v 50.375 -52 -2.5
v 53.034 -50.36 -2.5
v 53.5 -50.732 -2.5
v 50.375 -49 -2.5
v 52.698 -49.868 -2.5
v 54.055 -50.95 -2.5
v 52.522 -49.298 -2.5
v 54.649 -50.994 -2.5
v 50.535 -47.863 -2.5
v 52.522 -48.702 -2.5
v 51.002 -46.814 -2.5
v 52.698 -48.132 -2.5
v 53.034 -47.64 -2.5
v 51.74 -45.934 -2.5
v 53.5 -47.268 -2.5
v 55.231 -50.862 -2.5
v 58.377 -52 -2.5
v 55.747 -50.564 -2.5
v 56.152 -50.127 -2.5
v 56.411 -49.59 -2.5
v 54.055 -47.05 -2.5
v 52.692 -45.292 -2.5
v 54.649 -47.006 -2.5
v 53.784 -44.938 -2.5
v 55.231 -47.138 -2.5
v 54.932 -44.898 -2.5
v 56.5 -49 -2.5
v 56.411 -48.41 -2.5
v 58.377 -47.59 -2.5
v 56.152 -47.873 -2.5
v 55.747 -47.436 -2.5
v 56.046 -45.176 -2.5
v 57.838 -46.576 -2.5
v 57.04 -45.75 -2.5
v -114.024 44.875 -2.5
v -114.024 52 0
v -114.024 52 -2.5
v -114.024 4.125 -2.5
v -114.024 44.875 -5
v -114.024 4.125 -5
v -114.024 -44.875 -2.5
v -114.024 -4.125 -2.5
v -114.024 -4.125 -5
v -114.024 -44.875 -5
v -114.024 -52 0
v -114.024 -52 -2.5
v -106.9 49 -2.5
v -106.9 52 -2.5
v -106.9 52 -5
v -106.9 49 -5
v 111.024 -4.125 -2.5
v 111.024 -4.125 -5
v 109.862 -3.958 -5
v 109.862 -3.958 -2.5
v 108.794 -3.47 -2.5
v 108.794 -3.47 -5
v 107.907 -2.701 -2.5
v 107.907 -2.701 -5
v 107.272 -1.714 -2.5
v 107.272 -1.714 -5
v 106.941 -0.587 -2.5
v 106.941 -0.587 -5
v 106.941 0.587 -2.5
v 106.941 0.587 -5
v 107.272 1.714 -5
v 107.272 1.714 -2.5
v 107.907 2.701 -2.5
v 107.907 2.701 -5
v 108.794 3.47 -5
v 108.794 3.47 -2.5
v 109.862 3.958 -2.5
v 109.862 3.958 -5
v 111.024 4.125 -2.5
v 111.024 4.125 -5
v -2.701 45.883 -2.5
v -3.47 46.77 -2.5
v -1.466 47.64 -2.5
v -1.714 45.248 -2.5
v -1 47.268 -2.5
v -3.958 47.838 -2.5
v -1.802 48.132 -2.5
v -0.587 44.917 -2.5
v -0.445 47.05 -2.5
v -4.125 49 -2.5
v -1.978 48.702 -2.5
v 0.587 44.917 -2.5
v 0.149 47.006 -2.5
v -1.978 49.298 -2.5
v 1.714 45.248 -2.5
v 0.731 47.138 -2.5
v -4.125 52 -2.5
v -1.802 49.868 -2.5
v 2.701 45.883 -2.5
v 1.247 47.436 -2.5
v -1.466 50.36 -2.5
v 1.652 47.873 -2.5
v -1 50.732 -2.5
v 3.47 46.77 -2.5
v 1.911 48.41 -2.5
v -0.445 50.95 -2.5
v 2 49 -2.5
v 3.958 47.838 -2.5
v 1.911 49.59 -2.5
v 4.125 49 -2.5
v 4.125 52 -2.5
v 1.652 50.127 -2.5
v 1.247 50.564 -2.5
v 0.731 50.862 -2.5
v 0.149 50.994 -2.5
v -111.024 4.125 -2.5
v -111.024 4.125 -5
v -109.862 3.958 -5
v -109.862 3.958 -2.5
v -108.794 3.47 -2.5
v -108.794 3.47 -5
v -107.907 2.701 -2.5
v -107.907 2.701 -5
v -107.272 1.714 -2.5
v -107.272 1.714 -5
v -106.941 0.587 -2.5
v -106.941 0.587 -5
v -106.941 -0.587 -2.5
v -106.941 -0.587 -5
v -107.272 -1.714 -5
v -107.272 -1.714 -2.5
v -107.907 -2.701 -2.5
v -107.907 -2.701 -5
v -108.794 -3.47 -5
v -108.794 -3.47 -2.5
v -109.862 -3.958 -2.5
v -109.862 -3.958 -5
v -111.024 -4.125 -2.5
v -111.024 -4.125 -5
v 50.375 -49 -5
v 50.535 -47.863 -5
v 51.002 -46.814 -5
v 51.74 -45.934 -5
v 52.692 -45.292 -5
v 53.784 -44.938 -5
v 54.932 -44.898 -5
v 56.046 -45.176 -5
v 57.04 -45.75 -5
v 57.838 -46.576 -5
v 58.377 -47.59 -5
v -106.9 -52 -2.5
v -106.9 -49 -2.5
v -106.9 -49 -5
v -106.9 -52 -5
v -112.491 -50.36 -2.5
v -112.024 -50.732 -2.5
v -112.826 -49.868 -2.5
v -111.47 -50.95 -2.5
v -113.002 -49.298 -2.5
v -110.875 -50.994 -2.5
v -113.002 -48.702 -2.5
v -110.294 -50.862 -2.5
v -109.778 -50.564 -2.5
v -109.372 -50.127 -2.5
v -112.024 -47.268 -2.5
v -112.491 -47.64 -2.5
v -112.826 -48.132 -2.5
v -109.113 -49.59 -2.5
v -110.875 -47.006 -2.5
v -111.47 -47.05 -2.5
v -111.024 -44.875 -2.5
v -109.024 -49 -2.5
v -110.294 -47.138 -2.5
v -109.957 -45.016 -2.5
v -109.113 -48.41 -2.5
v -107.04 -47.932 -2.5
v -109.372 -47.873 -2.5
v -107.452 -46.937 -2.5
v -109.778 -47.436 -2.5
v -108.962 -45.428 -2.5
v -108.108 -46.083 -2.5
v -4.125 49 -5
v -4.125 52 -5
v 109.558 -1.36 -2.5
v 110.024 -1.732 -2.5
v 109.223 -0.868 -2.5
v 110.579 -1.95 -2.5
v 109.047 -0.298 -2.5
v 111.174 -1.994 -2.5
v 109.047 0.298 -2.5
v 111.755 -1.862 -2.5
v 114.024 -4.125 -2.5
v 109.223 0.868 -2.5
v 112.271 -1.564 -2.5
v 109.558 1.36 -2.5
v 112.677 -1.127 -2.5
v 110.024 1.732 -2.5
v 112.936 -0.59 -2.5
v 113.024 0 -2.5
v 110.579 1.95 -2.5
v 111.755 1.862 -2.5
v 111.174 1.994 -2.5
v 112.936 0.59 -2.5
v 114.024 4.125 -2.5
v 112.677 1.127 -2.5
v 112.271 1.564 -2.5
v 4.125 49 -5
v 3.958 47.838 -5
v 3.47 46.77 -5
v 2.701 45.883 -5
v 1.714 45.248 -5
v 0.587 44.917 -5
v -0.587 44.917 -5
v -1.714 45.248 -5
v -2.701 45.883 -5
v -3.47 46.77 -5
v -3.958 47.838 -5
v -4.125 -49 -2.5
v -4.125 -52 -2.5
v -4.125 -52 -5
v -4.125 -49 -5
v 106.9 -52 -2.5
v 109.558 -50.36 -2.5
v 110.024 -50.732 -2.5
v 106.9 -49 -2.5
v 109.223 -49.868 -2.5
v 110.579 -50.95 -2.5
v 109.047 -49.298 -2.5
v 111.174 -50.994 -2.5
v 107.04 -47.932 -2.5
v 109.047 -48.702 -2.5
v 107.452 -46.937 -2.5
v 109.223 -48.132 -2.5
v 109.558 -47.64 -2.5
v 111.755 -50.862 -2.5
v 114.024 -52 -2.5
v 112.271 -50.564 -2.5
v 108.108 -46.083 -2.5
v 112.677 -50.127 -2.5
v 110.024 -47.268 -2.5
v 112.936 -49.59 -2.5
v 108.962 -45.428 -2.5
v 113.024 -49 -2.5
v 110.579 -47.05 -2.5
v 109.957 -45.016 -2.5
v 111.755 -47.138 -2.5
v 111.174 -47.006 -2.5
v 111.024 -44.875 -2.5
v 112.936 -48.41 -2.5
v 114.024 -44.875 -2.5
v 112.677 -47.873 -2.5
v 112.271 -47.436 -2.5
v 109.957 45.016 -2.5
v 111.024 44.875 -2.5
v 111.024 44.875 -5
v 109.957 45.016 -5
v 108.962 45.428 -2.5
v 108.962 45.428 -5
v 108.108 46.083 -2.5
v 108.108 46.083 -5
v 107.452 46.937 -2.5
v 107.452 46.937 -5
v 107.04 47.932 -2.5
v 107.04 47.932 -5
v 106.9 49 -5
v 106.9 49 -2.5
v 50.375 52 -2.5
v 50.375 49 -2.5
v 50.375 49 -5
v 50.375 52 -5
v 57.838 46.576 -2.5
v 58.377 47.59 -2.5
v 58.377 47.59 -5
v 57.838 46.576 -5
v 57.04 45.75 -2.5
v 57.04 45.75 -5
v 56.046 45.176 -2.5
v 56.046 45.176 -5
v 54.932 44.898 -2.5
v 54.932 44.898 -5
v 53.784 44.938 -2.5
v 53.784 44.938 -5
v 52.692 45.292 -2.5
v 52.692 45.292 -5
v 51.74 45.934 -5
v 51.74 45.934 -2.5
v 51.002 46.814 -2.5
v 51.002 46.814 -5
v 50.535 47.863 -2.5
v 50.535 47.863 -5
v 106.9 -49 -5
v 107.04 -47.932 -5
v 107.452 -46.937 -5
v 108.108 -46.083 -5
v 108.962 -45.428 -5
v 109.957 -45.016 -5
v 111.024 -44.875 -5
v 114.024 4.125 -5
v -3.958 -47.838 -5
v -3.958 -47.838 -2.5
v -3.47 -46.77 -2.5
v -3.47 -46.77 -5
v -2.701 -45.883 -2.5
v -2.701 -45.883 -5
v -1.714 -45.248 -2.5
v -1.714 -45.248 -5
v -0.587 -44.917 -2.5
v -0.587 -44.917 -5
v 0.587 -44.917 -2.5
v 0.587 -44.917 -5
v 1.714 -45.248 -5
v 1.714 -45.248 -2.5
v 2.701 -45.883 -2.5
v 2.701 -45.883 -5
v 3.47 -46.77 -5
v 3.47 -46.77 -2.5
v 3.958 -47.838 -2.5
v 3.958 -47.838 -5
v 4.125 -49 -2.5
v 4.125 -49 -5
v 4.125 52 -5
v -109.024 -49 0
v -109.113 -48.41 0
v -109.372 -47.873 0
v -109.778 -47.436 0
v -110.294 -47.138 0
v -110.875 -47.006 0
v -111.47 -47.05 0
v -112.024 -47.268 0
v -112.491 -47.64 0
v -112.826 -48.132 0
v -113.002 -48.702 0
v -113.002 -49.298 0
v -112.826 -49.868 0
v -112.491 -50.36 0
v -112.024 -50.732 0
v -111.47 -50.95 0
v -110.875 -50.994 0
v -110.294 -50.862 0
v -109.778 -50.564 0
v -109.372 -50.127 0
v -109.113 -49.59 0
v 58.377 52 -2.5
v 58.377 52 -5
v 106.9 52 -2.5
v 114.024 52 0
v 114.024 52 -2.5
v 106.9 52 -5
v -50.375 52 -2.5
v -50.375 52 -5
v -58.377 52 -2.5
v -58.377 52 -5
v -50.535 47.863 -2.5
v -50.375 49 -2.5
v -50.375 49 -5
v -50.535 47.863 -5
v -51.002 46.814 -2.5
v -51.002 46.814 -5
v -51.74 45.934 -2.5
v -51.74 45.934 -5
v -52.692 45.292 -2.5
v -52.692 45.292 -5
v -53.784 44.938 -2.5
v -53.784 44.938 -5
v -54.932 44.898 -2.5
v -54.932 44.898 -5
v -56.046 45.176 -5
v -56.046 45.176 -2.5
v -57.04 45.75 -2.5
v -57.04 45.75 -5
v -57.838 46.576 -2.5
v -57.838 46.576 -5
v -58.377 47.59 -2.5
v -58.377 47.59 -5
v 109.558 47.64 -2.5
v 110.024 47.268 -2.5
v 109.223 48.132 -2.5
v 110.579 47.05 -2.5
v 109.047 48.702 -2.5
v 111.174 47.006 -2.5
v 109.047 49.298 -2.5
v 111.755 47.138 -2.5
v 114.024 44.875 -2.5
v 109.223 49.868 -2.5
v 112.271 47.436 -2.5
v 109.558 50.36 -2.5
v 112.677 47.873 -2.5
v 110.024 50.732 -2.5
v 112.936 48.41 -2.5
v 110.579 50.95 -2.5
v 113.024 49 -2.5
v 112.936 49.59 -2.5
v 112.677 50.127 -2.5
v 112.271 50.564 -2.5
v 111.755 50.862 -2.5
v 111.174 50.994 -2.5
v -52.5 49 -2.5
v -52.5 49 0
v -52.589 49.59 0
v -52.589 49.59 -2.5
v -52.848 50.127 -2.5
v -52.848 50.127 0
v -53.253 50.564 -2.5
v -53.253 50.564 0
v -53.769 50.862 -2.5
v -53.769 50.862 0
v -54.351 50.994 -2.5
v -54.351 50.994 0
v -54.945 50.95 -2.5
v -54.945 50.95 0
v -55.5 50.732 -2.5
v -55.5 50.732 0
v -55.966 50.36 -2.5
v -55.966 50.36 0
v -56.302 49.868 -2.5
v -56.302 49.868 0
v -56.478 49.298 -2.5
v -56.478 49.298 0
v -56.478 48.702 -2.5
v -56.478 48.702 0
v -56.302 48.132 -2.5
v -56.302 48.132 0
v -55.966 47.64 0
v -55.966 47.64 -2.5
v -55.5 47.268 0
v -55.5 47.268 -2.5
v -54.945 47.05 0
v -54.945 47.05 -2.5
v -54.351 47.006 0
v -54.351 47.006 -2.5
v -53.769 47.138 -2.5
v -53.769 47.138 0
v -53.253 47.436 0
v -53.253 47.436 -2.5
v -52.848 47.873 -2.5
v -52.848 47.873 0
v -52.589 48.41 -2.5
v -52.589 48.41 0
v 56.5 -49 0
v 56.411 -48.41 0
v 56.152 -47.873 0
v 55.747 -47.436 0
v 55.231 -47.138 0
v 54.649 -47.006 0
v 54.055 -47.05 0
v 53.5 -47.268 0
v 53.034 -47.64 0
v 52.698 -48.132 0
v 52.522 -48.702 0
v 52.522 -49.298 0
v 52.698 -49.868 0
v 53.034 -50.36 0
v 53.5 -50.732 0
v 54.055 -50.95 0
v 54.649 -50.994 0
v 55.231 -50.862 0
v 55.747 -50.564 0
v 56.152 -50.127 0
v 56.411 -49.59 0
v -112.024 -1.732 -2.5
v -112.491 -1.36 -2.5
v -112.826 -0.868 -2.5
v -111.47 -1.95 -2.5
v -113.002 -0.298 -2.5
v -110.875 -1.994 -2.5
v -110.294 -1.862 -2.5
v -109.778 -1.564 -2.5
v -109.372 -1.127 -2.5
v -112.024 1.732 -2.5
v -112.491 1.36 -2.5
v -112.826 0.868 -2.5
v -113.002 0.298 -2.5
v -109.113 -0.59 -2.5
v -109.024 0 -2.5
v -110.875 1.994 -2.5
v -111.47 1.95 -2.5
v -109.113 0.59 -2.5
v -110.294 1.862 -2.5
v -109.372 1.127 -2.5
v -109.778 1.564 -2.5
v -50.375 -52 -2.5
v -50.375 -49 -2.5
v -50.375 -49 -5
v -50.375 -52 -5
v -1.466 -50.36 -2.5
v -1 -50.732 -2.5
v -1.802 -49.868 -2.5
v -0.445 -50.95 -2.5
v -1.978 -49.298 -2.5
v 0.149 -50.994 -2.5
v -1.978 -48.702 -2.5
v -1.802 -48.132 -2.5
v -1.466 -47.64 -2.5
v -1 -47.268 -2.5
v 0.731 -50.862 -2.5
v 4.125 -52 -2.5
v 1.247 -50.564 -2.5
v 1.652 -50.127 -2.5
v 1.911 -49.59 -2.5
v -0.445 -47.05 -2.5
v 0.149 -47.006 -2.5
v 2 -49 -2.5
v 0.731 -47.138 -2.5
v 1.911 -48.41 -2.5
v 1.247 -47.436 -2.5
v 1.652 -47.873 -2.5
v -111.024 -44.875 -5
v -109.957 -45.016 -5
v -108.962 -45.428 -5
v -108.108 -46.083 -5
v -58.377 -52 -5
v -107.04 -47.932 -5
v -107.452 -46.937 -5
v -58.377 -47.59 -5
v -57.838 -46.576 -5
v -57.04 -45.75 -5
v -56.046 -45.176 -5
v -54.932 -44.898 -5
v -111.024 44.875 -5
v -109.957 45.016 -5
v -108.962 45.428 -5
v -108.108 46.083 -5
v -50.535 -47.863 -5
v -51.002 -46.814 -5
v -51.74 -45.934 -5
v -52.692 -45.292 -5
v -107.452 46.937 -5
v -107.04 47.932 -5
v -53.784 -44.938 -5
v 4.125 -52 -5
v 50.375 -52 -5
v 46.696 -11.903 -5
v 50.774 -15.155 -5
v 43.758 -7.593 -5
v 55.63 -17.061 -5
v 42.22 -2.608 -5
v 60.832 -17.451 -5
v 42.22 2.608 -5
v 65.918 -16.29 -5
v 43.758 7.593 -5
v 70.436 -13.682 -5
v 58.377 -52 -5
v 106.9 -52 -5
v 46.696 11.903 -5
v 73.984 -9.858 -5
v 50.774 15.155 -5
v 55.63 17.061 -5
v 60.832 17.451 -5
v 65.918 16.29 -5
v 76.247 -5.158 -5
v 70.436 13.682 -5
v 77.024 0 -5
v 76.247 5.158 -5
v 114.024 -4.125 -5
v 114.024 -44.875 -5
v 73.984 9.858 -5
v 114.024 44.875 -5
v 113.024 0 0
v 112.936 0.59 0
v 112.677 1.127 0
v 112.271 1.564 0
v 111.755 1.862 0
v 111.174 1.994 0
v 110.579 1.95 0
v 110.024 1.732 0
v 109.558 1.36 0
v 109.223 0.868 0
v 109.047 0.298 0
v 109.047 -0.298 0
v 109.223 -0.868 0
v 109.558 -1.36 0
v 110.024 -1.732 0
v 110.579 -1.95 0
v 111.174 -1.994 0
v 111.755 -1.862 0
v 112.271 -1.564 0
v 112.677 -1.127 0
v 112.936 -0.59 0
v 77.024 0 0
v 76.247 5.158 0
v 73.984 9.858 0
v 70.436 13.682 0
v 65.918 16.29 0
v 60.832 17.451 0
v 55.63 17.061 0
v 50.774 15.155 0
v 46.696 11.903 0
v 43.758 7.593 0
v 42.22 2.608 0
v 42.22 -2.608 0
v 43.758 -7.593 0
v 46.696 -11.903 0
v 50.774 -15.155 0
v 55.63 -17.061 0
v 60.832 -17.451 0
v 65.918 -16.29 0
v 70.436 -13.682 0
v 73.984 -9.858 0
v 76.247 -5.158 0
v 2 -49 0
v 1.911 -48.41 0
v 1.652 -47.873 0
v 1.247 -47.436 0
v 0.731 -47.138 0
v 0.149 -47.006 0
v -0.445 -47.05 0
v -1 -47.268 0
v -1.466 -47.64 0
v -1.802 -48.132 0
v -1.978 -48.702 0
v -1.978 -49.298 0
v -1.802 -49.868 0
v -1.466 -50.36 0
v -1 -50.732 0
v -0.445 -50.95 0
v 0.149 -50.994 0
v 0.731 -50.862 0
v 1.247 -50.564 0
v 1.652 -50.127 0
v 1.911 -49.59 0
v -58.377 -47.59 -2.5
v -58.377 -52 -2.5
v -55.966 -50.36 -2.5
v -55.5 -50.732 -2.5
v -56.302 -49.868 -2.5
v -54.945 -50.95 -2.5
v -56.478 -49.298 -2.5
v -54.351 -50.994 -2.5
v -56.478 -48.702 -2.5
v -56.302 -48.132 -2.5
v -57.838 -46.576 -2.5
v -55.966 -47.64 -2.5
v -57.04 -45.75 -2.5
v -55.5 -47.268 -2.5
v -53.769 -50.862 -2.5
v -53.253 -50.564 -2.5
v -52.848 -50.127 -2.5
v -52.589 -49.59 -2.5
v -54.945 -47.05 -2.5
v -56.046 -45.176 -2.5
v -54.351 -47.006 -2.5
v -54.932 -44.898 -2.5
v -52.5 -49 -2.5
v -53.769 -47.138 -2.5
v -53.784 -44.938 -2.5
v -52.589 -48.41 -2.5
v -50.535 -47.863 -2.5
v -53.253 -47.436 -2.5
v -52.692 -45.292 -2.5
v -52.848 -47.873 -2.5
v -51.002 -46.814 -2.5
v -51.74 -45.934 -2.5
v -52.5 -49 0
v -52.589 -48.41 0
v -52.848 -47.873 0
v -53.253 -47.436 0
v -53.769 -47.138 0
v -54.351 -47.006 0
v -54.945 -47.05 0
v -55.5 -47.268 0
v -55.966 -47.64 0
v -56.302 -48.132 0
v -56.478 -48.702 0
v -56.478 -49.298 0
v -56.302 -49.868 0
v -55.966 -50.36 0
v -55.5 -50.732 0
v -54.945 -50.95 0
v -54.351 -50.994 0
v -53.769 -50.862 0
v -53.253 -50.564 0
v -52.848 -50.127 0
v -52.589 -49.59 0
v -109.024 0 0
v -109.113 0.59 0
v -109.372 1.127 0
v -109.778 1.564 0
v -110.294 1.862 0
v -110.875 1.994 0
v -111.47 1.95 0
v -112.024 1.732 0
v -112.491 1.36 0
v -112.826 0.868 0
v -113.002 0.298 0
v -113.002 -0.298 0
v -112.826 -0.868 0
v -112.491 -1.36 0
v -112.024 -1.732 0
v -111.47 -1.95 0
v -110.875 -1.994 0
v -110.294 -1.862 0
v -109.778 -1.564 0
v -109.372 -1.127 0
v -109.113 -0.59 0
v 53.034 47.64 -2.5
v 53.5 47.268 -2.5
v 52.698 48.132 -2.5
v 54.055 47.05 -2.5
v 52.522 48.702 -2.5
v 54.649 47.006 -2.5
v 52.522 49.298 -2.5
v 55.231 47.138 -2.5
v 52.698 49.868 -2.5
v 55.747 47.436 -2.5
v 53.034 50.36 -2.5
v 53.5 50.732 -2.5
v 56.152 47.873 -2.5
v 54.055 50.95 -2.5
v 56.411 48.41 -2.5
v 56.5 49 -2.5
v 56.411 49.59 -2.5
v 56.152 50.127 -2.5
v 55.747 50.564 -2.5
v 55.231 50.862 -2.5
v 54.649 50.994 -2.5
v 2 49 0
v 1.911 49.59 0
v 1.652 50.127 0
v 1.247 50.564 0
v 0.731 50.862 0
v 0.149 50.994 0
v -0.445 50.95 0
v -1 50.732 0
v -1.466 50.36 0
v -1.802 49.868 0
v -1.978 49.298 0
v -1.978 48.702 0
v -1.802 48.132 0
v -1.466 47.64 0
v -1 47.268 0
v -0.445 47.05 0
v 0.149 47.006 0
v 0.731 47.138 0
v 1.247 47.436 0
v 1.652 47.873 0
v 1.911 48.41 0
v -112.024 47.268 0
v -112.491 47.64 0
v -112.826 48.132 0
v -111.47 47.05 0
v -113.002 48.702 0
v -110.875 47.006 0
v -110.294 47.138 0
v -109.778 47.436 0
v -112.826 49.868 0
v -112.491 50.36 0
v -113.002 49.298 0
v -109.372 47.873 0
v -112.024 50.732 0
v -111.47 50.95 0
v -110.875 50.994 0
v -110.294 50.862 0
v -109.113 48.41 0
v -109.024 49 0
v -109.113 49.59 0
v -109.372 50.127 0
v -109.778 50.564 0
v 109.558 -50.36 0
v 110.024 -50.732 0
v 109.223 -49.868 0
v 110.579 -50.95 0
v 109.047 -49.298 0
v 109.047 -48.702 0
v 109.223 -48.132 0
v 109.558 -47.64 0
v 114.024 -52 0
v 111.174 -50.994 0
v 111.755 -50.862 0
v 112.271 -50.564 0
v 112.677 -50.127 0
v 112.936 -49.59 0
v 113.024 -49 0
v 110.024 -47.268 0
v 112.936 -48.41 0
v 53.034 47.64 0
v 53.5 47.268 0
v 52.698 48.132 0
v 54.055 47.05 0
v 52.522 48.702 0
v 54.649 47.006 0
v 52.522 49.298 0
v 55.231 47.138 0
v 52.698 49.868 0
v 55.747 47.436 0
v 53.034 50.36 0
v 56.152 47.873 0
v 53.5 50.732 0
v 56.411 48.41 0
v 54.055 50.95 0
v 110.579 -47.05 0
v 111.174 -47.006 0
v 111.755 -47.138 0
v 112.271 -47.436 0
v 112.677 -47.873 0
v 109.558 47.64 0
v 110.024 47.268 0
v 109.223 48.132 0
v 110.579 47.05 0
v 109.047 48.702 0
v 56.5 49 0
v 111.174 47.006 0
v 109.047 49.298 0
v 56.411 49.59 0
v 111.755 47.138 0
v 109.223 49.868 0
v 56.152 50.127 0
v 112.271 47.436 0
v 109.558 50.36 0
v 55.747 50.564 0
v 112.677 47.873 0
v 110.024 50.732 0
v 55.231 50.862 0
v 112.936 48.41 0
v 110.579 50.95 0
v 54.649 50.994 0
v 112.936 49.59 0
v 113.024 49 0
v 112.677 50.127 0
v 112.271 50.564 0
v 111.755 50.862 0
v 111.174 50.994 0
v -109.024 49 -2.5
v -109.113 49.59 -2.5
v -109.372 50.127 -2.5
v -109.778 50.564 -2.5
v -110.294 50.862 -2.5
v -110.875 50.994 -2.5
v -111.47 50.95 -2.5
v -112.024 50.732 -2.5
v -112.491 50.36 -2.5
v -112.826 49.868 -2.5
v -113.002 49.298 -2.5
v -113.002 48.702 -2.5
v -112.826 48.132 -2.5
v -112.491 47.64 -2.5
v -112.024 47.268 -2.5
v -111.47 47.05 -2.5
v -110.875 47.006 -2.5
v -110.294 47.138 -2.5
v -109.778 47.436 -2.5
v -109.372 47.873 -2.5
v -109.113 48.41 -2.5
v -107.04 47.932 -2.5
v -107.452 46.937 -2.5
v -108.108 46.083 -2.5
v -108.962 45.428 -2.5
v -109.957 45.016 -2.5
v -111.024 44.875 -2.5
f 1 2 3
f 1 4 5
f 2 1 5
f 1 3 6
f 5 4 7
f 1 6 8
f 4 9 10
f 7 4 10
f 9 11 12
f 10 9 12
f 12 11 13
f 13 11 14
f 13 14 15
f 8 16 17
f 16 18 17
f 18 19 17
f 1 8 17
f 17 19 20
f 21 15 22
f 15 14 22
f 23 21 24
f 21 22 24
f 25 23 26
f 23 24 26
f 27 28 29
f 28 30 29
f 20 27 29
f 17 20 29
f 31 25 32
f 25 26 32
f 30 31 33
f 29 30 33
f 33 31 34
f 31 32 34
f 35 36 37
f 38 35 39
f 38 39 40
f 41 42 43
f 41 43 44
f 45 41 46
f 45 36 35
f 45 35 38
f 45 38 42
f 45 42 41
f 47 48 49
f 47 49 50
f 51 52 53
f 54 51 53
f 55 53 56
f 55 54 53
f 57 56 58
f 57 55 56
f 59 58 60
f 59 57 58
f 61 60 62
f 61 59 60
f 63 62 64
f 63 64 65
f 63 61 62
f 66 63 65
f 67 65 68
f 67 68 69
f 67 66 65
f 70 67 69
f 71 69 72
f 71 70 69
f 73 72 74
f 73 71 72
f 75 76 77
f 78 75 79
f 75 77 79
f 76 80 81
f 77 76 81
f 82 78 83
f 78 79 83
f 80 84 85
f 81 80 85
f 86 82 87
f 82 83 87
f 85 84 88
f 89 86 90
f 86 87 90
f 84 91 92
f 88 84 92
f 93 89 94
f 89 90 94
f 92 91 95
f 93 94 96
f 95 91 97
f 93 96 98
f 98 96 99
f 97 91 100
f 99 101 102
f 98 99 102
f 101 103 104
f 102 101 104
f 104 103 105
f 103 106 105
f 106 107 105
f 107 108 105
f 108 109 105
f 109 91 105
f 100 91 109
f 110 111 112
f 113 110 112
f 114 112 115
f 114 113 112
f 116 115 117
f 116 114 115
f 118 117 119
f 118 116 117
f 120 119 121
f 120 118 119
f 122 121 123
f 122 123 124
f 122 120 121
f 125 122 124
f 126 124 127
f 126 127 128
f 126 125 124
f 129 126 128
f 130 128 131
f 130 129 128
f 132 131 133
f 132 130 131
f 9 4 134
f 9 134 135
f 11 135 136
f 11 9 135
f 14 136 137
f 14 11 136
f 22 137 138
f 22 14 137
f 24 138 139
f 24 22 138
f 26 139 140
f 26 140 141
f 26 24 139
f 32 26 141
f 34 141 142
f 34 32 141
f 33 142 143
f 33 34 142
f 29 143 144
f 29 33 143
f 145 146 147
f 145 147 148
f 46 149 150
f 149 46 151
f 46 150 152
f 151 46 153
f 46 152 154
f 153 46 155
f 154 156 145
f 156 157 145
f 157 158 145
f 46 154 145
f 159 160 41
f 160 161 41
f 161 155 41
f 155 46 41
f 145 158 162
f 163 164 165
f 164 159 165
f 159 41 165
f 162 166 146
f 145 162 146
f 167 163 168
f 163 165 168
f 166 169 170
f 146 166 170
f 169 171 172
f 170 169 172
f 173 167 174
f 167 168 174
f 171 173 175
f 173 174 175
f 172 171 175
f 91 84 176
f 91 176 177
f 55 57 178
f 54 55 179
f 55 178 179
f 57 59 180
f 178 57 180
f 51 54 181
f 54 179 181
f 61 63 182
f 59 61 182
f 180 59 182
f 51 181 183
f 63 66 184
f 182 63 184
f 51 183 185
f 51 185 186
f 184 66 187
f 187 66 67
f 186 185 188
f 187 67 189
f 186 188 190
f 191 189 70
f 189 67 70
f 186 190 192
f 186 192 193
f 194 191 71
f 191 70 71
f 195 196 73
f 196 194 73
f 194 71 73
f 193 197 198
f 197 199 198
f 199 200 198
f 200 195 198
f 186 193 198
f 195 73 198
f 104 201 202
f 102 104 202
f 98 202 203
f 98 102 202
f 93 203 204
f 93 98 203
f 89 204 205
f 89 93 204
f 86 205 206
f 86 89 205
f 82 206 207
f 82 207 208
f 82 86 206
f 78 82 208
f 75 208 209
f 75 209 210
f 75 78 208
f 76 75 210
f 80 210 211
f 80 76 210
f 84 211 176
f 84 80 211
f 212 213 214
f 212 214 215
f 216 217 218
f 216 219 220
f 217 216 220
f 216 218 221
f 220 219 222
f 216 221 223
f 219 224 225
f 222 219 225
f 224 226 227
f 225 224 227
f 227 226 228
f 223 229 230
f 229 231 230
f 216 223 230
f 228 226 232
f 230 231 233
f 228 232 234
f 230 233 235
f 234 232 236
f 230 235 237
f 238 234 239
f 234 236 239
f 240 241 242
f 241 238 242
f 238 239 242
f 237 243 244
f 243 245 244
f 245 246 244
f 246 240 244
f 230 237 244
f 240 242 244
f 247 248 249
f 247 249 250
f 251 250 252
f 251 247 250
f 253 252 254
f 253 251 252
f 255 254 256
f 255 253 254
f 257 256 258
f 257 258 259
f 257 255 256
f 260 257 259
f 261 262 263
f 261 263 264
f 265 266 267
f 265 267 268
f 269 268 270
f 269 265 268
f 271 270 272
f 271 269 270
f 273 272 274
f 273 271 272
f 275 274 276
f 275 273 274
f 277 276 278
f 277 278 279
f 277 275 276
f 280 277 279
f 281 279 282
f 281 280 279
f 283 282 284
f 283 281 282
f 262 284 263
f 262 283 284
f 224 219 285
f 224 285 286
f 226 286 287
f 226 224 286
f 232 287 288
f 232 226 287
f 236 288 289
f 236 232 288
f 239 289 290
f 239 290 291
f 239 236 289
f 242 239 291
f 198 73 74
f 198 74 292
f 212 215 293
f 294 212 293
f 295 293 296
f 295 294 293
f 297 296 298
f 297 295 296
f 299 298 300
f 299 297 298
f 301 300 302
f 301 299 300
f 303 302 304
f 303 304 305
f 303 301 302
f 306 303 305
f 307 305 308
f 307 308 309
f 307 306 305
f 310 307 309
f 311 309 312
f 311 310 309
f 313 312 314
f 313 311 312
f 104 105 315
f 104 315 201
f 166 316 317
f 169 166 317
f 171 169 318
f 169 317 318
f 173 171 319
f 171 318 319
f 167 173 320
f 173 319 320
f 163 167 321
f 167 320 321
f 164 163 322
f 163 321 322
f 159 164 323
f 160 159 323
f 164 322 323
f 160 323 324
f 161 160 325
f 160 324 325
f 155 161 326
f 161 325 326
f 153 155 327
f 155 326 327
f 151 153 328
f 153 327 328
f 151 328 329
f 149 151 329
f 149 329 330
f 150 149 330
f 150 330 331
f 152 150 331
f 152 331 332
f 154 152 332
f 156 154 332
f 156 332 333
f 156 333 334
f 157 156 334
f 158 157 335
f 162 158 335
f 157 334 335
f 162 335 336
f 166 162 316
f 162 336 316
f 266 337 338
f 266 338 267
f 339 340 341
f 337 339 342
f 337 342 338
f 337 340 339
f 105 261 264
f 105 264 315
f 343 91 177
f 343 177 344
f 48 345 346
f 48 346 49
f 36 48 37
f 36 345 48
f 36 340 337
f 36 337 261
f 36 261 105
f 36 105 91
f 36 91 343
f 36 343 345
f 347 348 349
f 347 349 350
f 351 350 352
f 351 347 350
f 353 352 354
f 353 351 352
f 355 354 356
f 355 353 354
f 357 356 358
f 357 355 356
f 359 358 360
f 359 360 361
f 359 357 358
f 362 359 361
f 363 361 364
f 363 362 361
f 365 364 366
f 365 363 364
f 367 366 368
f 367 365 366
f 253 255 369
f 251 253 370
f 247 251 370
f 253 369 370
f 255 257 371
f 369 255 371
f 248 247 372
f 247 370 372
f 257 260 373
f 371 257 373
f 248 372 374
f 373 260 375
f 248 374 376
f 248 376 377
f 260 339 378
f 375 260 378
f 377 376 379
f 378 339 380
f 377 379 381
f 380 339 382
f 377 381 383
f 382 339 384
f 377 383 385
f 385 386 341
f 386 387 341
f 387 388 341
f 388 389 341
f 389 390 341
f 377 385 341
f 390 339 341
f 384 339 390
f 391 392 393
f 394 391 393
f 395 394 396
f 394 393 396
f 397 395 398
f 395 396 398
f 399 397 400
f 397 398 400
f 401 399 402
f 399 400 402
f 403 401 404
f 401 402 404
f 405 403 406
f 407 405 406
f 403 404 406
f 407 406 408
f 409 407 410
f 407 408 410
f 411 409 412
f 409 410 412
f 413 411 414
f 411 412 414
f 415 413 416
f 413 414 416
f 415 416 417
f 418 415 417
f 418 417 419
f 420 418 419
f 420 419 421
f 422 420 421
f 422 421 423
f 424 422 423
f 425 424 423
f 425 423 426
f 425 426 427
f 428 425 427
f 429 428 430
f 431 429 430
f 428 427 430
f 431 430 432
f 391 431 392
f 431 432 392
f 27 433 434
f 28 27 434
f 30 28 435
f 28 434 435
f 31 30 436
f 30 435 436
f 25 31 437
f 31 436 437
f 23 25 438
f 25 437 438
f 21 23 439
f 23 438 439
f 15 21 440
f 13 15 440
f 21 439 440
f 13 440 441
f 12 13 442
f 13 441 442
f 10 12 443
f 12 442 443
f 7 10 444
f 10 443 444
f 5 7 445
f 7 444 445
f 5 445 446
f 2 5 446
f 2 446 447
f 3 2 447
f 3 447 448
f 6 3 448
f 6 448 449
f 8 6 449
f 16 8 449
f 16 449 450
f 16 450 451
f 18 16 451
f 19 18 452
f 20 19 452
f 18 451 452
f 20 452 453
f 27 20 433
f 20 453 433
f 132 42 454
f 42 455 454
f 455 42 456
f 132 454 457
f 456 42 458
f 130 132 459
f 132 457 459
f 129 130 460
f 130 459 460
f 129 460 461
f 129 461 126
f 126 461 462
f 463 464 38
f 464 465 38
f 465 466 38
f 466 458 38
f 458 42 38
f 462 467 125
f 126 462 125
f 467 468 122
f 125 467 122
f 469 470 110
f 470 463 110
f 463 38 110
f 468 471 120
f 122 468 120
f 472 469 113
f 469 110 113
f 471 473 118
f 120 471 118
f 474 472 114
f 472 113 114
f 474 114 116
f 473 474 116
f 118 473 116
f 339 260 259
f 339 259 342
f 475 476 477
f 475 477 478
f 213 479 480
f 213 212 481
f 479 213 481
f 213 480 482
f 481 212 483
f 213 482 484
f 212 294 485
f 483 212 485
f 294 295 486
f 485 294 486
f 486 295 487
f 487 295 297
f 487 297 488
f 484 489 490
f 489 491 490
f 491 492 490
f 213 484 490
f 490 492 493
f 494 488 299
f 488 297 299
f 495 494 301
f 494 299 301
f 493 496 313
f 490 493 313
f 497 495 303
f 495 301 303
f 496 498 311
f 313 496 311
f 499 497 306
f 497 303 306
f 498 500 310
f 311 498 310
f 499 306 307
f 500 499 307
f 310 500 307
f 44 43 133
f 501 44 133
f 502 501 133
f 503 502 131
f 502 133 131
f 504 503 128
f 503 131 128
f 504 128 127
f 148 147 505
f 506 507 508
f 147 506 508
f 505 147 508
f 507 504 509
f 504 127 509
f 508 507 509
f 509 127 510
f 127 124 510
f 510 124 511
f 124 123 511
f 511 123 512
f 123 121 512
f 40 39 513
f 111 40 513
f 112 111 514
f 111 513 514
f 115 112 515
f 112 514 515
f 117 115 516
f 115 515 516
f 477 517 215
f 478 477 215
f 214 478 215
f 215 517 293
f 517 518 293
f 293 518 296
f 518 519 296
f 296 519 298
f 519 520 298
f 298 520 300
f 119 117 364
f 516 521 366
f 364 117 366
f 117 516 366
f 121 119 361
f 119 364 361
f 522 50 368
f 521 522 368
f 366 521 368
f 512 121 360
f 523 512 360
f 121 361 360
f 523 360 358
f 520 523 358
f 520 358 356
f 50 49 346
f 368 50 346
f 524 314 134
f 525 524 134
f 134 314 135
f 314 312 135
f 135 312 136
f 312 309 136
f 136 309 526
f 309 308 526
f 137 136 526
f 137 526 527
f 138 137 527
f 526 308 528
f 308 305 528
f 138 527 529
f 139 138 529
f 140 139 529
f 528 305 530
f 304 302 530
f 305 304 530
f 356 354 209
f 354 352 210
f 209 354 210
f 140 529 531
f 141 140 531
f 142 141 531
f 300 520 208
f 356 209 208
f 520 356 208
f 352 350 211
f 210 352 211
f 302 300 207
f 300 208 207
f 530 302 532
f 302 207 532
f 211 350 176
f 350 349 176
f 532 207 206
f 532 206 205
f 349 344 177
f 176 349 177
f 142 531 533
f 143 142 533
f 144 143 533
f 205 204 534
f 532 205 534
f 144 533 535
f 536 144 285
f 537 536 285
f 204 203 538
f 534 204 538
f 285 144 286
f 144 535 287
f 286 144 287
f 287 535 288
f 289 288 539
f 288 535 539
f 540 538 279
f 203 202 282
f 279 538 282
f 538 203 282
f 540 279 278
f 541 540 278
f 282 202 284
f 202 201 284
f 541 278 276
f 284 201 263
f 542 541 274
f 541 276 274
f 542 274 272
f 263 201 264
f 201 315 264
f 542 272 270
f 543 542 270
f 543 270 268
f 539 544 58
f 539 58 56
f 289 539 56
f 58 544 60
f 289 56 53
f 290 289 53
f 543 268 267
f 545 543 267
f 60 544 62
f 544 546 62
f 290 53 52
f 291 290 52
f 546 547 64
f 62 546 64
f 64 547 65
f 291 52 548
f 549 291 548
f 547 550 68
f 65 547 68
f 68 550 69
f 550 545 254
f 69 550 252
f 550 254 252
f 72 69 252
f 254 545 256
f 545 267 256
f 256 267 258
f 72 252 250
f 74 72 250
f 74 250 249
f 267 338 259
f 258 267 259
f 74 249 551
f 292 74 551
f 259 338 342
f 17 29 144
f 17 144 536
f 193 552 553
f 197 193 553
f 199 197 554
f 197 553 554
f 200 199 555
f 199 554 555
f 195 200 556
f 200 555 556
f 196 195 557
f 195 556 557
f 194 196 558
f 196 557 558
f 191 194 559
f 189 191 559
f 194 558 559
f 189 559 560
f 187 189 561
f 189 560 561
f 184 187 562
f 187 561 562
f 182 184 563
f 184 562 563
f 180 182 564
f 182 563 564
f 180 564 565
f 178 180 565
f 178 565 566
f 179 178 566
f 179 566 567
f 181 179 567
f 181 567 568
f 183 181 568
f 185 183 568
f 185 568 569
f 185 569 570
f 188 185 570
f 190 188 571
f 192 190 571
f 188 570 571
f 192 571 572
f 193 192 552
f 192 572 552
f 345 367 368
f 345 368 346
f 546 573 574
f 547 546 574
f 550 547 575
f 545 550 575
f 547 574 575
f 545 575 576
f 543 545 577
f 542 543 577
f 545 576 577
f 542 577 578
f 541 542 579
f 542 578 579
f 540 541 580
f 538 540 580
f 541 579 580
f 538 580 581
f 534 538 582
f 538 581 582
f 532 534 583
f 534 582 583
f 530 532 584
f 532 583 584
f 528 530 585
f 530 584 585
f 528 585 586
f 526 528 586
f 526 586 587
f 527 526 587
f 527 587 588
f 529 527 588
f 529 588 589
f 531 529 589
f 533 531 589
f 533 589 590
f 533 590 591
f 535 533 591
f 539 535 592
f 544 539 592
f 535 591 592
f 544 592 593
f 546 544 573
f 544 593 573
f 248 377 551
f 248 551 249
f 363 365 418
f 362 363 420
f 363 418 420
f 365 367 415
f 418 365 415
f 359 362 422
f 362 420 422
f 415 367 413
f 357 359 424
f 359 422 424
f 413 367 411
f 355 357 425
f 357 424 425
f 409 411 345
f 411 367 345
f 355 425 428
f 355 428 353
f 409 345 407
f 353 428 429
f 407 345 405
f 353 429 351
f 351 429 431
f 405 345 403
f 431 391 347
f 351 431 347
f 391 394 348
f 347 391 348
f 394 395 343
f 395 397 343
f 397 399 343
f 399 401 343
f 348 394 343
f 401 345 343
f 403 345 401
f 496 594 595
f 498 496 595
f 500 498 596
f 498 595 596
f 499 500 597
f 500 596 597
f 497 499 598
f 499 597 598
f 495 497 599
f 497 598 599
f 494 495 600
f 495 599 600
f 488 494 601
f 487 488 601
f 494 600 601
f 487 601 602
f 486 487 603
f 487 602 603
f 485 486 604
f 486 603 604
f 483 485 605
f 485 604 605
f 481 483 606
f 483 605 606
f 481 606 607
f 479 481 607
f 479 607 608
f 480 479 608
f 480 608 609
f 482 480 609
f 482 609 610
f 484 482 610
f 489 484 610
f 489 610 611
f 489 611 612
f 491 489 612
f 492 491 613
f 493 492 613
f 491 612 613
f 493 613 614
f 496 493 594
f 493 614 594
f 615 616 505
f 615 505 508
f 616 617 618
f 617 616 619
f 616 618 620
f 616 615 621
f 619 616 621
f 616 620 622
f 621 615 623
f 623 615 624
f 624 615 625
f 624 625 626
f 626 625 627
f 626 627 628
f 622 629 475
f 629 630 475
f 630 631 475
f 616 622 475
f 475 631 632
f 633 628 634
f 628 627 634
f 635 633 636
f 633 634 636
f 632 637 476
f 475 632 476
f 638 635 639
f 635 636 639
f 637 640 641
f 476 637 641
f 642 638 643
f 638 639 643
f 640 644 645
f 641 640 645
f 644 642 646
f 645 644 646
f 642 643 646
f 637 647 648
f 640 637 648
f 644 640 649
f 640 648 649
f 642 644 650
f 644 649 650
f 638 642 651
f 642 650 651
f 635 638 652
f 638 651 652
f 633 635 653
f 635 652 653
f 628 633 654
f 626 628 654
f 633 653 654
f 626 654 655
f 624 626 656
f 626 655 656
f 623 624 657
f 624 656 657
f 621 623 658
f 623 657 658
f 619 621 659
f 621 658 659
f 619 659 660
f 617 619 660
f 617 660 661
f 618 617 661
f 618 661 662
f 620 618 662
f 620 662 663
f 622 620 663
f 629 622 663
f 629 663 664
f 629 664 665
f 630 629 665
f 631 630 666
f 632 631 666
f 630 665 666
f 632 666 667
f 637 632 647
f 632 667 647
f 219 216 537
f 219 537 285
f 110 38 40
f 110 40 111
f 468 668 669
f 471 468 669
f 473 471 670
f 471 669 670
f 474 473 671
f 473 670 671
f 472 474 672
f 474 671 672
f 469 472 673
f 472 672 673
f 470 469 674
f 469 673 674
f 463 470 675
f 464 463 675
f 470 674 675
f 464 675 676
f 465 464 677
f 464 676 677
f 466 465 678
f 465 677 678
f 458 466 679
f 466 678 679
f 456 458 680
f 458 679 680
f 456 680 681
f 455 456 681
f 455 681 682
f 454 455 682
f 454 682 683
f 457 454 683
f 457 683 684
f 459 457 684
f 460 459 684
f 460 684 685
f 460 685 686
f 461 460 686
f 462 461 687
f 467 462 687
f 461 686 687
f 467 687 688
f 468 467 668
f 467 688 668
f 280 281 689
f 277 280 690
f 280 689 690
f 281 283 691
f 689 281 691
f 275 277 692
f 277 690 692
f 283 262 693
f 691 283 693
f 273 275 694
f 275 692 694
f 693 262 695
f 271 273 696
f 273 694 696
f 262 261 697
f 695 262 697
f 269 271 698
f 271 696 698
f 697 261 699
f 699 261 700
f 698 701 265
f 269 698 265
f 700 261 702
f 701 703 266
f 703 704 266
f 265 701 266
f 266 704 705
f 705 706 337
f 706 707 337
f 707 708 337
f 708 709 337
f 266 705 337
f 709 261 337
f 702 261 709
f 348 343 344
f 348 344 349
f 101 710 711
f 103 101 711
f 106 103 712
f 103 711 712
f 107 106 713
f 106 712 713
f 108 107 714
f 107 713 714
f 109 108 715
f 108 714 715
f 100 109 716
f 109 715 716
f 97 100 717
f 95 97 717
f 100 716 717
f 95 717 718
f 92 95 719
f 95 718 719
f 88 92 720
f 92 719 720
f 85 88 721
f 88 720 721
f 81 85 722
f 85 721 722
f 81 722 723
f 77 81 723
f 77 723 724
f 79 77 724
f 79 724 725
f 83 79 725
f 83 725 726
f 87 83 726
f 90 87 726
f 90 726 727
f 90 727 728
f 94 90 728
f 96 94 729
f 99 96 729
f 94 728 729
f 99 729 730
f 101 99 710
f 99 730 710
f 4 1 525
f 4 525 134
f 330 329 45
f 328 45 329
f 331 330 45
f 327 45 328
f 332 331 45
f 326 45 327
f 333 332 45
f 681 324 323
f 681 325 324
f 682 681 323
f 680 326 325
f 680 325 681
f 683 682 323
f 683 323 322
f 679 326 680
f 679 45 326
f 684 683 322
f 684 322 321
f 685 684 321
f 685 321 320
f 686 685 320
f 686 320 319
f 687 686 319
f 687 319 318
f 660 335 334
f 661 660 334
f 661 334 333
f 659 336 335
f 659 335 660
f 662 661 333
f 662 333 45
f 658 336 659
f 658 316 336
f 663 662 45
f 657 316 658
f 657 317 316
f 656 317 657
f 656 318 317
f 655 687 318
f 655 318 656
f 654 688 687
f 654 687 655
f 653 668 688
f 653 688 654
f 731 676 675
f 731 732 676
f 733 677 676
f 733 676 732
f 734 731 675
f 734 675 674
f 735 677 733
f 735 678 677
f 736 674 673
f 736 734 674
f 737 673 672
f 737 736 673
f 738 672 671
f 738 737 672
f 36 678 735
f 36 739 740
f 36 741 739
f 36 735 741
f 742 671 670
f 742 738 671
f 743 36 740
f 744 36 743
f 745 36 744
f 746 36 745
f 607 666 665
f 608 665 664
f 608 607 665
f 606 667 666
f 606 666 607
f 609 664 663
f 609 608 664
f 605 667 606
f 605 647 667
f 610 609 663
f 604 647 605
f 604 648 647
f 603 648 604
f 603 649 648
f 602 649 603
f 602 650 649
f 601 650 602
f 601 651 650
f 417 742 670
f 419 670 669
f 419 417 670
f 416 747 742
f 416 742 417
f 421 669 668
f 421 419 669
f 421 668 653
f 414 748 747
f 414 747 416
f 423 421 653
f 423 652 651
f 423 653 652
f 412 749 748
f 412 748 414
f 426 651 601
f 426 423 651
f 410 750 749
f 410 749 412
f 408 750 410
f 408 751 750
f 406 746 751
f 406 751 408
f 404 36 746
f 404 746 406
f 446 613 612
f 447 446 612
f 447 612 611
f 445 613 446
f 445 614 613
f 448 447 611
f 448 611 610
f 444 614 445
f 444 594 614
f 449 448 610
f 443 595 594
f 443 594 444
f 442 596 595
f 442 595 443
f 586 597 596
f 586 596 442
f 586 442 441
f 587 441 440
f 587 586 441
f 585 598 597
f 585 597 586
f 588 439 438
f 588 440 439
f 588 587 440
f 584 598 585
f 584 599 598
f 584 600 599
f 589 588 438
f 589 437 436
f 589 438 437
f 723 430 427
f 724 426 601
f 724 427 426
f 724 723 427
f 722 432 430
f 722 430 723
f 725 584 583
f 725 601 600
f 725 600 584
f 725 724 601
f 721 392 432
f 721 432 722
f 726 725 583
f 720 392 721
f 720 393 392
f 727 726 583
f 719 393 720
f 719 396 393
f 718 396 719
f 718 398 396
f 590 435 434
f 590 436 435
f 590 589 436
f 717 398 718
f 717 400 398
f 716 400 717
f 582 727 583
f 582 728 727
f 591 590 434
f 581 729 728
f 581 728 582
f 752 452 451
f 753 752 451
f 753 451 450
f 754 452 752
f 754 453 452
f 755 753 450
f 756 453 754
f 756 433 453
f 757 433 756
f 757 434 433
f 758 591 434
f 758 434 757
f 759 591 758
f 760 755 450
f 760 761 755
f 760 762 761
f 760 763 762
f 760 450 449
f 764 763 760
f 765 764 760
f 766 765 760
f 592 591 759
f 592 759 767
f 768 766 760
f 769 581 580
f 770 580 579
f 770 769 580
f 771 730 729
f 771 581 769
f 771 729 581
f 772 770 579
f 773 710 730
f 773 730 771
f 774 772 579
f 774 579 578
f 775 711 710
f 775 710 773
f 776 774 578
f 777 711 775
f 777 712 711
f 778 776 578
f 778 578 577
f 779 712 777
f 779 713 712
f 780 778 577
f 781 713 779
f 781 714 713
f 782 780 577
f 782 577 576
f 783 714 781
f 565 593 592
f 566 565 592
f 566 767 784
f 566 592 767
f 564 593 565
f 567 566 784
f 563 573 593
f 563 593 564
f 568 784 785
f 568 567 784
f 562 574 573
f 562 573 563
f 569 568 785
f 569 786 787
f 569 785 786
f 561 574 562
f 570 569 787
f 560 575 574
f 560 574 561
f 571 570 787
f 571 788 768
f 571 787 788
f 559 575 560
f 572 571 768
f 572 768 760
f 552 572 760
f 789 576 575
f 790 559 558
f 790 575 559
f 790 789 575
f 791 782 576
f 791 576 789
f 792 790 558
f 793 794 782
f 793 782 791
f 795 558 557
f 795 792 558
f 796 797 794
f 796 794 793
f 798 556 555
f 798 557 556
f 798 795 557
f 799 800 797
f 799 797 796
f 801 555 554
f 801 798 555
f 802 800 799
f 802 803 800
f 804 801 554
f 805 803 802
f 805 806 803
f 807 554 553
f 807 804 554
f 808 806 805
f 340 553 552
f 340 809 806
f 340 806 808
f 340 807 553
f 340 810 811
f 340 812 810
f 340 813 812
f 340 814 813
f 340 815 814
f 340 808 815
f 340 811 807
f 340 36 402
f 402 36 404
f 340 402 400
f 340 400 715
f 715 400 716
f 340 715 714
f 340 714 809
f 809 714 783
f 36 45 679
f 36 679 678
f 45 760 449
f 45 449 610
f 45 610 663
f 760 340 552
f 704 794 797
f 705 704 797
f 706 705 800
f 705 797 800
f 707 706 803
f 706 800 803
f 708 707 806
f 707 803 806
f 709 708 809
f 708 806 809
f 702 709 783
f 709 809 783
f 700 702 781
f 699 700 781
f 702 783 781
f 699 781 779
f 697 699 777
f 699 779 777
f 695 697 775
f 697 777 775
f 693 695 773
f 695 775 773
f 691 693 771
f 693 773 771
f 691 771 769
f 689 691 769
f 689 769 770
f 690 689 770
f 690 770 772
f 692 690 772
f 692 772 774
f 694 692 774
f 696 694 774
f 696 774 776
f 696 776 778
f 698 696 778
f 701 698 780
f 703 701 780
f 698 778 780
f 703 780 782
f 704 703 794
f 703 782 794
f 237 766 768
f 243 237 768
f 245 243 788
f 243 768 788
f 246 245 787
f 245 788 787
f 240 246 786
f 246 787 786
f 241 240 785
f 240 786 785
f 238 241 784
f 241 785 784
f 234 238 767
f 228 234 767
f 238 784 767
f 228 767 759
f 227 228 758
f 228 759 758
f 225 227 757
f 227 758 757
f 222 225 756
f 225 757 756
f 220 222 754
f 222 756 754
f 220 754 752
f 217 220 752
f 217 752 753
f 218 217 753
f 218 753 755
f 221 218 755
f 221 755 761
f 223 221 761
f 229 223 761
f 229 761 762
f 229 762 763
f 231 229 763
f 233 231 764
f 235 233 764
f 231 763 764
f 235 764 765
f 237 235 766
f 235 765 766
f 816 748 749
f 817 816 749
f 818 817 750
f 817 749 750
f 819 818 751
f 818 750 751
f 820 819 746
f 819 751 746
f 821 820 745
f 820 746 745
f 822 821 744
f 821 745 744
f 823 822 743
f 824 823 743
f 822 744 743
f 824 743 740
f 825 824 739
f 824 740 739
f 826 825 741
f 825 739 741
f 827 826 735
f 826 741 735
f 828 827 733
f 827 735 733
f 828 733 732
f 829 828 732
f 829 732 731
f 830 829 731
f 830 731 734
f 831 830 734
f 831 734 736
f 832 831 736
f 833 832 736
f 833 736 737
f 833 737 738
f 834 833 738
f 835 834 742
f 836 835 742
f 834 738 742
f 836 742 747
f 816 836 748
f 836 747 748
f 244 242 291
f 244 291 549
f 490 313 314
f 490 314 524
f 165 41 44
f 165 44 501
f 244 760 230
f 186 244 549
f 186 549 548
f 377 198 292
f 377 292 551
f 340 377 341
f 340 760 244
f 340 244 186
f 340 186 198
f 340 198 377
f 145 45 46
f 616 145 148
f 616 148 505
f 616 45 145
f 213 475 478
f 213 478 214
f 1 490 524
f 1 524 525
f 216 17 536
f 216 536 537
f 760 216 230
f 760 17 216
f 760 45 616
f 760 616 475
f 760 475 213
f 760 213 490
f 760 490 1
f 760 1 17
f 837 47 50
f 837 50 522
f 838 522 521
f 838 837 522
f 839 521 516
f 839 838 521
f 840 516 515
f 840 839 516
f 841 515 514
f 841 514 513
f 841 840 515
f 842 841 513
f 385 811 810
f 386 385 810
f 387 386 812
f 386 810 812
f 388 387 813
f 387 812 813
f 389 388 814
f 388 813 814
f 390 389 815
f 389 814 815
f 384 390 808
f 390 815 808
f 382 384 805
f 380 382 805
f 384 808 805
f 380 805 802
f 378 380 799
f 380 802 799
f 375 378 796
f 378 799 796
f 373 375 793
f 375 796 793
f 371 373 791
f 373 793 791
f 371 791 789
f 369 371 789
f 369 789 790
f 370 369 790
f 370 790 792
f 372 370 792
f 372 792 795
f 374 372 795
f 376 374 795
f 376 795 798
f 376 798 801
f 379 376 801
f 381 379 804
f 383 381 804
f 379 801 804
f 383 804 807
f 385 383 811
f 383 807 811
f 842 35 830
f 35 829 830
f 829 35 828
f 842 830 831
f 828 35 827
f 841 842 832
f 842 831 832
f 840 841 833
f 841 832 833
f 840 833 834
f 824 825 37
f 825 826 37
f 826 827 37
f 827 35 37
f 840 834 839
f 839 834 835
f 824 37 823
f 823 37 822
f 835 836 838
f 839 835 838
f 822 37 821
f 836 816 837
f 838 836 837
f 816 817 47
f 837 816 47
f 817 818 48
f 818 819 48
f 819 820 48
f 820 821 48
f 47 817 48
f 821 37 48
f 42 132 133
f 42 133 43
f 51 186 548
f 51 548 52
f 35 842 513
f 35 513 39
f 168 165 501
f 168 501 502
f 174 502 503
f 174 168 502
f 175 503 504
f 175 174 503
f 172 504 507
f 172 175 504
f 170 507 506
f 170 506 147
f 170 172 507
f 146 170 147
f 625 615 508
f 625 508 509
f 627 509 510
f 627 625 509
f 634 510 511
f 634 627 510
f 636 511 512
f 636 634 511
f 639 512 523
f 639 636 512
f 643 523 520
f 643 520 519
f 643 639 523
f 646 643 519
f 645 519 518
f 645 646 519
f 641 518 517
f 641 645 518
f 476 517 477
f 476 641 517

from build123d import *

# Parameters (mm, degrees)
F0_R     = 23.5
F0_R_2   = 17.5
F1_DEPTH = 5
F0_R_3   = 2
F2_DEPTH = 2.5


# Not quite as in the source:
# - a feature names something its author has since deleted; it is built from what else it names


with BuildPart() as f1:
    # F0 (on Top) → F1 (new body)
    with BuildSketch(Plane.XY):
        with BuildLine():
            Line((-58.3766478719, 52), (-106.8995, 52))
            Line((-106.8995, 52), (-106.8995, 49))
            ThreePointArc((-106.8995, 49), (-108.1076845276, 46.0831845276), (-111.0245, 44.875))
            Line((-111.0245, 44.875), (-114.0245, 44.875))
            Line((-114.0245, 44.875), (-114.0245, 4.125))
            Line((-114.0245, 4.125), (-111.0245, 4.125))
            ThreePointArc((-111.0245, 4.125), (-106.8995, 0), (-111.0245, -4.125))
            Line((-111.0245, -4.125), (-114.0245, -4.125))
            Line((-114.0245, -4.125), (-114.0245, -44.875))
            Line((-114.0245, -44.875), (-111.0245, -44.875))
            ThreePointArc((-111.0245, -44.875), (-108.1076845276, -46.0831845276), (-106.8995, -49))
            Line((-106.8995, -49), (-106.8995, -52))
            Line((-106.8995, -52), (-58.3766478719, -52))
            Line((-58.3766478719, -52), (-58.3766478719, -47.5903098648))
            ThreePointArc((-58.3766478719, -47.5903098648), (-53.7843001577, -44.9375624638), (-50.375, -49))
            Line((-50.375, -49), (-50.375, -52))
            Line((-50.375, -52), (-4.125, -52))
            Line((-4.125, -52), (-4.125, -49))
            ThreePointArc((-4.125, -49), (0, -44.875), (4.125, -49))
            Line((4.125, -49), (4.125, -52))
            Line((4.125, -52), (50.375, -52))
            Line((50.375, -52), (50.375, -49))
            ThreePointArc((50.375, -49), (53.7843001577, -44.9375624638), (58.3766478719, -47.5903098648))
            Line((58.3766478719, -47.5903098648), (58.3766478719, -52))
            Line((58.3766478719, -52), (106.8995, -52))
            Line((106.8995, -52), (106.8995, -49))
            ThreePointArc((106.8995, -49), (108.1076845276, -46.0831845276), (111.0245, -44.875))
            Line((111.0245, -44.875), (114.0245, -44.875))
            Line((114.0245, -44.875), (114.0245, -4.125))
            Line((114.0245, -4.125), (111.0245, -4.125))
            ThreePointArc((111.0245, -4.125), (106.8995, 0), (111.0245, 4.125))
            Line((111.0245, 4.125), (114.0245, 4.125))
            Line((114.0245, 4.125), (114.0245, 44.875))
            Line((114.0245, 44.875), (111.0245, 44.875))
            ThreePointArc((111.0245, 44.875), (108.1076845276, 46.0831845276), (106.8995, 49))
            Line((106.8995, 49), (106.8995, 52))
            Line((106.8995, 52), (58.3766478719, 52))
            Line((58.3766478719, 52), (58.3766478719, 47.5903098648))
            ThreePointArc((58.3766478719, 47.5903098648), (53.7843001577, 44.9375624638), (50.375, 49))
            Line((50.375, 49), (50.375, 52))
            Line((50.375, 52), (4.125, 52))
            Line((4.125, 52), (4.125, 49))
            ThreePointArc((4.125, 49), (0, 44.875), (-4.125, 49))
            Line((-4.125, 49), (-4.125, 52))
            Line((-4.125, 52), (-50.375, 52))
            Line((-50.375, 52), (-50.375, 49))
            ThreePointArc((-50.375, 49), (-53.7843001577, 44.9375624638), (-58.3766478719, 47.5903098648))
            Line((-58.3766478719, 47.5903098648), (-58.3766478719, 52))
        make_face()
        with Locations((59.5245, 0)):
            Circle(F0_R, mode=Mode.SUBTRACT)
        with Locations((59.5245, 0)):
            Circle(F0_R)
        with Locations((59.5245, 0)):
            Circle(F0_R_2, mode=Mode.SUBTRACT)
    extrude(amount=-F1_DEPTH)

    # F0 (on Top) → F2 (join)
    with BuildSketch(Plane.XY):
        with BuildLine():
            Line((-106.8995, 52), (-114.0245, 52))
            Line((-114.0245, 52), (-114.0245, 44.875))
            Line((-114.0245, 44.875), (-111.0245, 44.875))
            ThreePointArc((-111.0245, 44.875), (-108.1076845276, 46.0831845276), (-106.8995, 49))
            Line((-106.8995, 49), (-106.8995, 52))
        make_face()
        with Locations((-111.0245, 49)):
            Circle(F0_R_3, mode=Mode.SUBTRACT)
        with BuildLine():
            Line((-111.0245, 4.125), (-114.0245, 4.125))
            Line((-114.0245, 4.125), (-114.0245, -4.125))
            Line((-114.0245, -4.125), (-111.0245, -4.125))
            ThreePointArc((-111.0245, -4.125), (-106.8995, 0), (-111.0245, 4.125))
        make_face()
        with Locations((-111.0245, 0)):
            Circle(F0_R_3, mode=Mode.SUBTRACT)
        with BuildLine():
            Line((-111.0245, -44.875), (-114.0245, -44.875))
            Line((-114.0245, -44.875), (-114.0245, -52))
            Line((-114.0245, -52), (-106.8995, -52))
            Line((-106.8995, -52), (-106.8995, -49))
            ThreePointArc((-106.8995, -49), (-108.1076845276, -46.0831845276), (-111.0245, -44.875))
        make_face()
        with Locations((-111.0245, -49)):
            Circle(F0_R_3, mode=Mode.SUBTRACT)
        with BuildLine():
            Line((-58.3766478719, -47.5903098648), (-58.3766478719, -52))
            Line((-58.3766478719, -52), (-50.375, -52))
            Line((-50.375, -52), (-50.375, -49))
            ThreePointArc((-50.375, -49), (-53.7843001577, -44.9375624638), (-58.3766478719, -47.5903098648))
        make_face()
        with Locations((-54.5, -49)):
            Circle(F0_R_3, mode=Mode.SUBTRACT)
        with BuildLine():
            Line((-4.125, -49), (-4.125, -52))
            Line((-4.125, -52), (4.125, -52))
            Line((4.125, -52), (4.125, -49))
            ThreePointArc((4.125, -49), (0, -44.875), (-4.125, -49))
        make_face()
        with Locations((0, -49)):
            Circle(F0_R_3, mode=Mode.SUBTRACT)
        with BuildLine():
            Line((50.375, -49), (50.375, -52))
            Line((50.375, -52), (58.3766478719, -52))
            Line((58.3766478719, -52), (58.3766478719, -47.5903098648))
            ThreePointArc((58.3766478719, -47.5903098648), (53.7843001577, -44.9375624638), (50.375, -49))
        make_face()
        with Locations((54.5, -49)):
            Circle(F0_R_3, mode=Mode.SUBTRACT)
        with BuildLine():
            Line((114.0245, -52), (114.0245, -44.875))
            Line((114.0245, -44.875), (111.0245, -44.875))
            ThreePointArc((111.0245, -44.875), (108.1076845276, -46.0831845276), (106.8995, -49))
            Line((106.8995, -49), (106.8995, -52))
            Line((106.8995, -52), (114.0245, -52))
        make_face()
        with Locations((111.0245, -49)):
            Circle(F0_R_3, mode=Mode.SUBTRACT)
        with BuildLine():
            Line((114.0245, -4.125), (114.0245, 4.125))
            Line((114.0245, 4.125), (111.0245, 4.125))
            ThreePointArc((111.0245, 4.125), (106.8995, 0), (111.0245, -4.125))
            Line((111.0245, -4.125), (114.0245, -4.125))
        make_face()
        with Locations((111.0245, 0)):
            Circle(F0_R_3, mode=Mode.SUBTRACT)
        with BuildLine():
            Line((114.0245, 52), (106.8995, 52))
            Line((106.8995, 52), (106.8995, 49))
            ThreePointArc((106.8995, 49), (108.1076845276, 46.0831845276), (111.0245, 44.875))
            Line((111.0245, 44.875), (114.0245, 44.875))
            Line((114.0245, 44.875), (114.0245, 52))
        make_face()
        with Locations((111.0245, 49)):
            Circle(F0_R_3, mode=Mode.SUBTRACT)
        with BuildLine():
            Line((58.3766478719, 52), (50.375, 52))
            Line((50.375, 52), (50.375, 49))
            ThreePointArc((50.375, 49), (53.7843001577, 44.9375624638), (58.3766478719, 47.5903098648))
            Line((58.3766478719, 47.5903098648), (58.3766478719, 52))
        make_face()
        with Locations((54.5, 49)):
            Circle(F0_R_3, mode=Mode.SUBTRACT)
        with BuildLine():
            Line((4.125, 52), (-4.125, 52))
            Line((-4.125, 52), (-4.125, 49))
            ThreePointArc((-4.125, 49), (0, 44.875), (4.125, 49))
            Line((4.125, 49), (4.125, 52))
        make_face()
        with Locations((0, 49)):
            Circle(F0_R_3, mode=Mode.SUBTRACT)
        with BuildLine():
            Line((-50.375, 52), (-58.3766478719, 52))
            Line((-58.3766478719, 52), (-58.3766478719, 47.5903098648))
            ThreePointArc((-58.3766478719, 47.5903098648), (-53.7843001577, 44.9375624638), (-50.375, 49))
            Line((-50.375, 49), (-50.375, 52))
        make_face()
        with Locations((-54.5, 49)):
            Circle(F0_R_3, mode=Mode.SUBTRACT)
    extrude(amount=-F2_DEPTH)


solid = f1.part
